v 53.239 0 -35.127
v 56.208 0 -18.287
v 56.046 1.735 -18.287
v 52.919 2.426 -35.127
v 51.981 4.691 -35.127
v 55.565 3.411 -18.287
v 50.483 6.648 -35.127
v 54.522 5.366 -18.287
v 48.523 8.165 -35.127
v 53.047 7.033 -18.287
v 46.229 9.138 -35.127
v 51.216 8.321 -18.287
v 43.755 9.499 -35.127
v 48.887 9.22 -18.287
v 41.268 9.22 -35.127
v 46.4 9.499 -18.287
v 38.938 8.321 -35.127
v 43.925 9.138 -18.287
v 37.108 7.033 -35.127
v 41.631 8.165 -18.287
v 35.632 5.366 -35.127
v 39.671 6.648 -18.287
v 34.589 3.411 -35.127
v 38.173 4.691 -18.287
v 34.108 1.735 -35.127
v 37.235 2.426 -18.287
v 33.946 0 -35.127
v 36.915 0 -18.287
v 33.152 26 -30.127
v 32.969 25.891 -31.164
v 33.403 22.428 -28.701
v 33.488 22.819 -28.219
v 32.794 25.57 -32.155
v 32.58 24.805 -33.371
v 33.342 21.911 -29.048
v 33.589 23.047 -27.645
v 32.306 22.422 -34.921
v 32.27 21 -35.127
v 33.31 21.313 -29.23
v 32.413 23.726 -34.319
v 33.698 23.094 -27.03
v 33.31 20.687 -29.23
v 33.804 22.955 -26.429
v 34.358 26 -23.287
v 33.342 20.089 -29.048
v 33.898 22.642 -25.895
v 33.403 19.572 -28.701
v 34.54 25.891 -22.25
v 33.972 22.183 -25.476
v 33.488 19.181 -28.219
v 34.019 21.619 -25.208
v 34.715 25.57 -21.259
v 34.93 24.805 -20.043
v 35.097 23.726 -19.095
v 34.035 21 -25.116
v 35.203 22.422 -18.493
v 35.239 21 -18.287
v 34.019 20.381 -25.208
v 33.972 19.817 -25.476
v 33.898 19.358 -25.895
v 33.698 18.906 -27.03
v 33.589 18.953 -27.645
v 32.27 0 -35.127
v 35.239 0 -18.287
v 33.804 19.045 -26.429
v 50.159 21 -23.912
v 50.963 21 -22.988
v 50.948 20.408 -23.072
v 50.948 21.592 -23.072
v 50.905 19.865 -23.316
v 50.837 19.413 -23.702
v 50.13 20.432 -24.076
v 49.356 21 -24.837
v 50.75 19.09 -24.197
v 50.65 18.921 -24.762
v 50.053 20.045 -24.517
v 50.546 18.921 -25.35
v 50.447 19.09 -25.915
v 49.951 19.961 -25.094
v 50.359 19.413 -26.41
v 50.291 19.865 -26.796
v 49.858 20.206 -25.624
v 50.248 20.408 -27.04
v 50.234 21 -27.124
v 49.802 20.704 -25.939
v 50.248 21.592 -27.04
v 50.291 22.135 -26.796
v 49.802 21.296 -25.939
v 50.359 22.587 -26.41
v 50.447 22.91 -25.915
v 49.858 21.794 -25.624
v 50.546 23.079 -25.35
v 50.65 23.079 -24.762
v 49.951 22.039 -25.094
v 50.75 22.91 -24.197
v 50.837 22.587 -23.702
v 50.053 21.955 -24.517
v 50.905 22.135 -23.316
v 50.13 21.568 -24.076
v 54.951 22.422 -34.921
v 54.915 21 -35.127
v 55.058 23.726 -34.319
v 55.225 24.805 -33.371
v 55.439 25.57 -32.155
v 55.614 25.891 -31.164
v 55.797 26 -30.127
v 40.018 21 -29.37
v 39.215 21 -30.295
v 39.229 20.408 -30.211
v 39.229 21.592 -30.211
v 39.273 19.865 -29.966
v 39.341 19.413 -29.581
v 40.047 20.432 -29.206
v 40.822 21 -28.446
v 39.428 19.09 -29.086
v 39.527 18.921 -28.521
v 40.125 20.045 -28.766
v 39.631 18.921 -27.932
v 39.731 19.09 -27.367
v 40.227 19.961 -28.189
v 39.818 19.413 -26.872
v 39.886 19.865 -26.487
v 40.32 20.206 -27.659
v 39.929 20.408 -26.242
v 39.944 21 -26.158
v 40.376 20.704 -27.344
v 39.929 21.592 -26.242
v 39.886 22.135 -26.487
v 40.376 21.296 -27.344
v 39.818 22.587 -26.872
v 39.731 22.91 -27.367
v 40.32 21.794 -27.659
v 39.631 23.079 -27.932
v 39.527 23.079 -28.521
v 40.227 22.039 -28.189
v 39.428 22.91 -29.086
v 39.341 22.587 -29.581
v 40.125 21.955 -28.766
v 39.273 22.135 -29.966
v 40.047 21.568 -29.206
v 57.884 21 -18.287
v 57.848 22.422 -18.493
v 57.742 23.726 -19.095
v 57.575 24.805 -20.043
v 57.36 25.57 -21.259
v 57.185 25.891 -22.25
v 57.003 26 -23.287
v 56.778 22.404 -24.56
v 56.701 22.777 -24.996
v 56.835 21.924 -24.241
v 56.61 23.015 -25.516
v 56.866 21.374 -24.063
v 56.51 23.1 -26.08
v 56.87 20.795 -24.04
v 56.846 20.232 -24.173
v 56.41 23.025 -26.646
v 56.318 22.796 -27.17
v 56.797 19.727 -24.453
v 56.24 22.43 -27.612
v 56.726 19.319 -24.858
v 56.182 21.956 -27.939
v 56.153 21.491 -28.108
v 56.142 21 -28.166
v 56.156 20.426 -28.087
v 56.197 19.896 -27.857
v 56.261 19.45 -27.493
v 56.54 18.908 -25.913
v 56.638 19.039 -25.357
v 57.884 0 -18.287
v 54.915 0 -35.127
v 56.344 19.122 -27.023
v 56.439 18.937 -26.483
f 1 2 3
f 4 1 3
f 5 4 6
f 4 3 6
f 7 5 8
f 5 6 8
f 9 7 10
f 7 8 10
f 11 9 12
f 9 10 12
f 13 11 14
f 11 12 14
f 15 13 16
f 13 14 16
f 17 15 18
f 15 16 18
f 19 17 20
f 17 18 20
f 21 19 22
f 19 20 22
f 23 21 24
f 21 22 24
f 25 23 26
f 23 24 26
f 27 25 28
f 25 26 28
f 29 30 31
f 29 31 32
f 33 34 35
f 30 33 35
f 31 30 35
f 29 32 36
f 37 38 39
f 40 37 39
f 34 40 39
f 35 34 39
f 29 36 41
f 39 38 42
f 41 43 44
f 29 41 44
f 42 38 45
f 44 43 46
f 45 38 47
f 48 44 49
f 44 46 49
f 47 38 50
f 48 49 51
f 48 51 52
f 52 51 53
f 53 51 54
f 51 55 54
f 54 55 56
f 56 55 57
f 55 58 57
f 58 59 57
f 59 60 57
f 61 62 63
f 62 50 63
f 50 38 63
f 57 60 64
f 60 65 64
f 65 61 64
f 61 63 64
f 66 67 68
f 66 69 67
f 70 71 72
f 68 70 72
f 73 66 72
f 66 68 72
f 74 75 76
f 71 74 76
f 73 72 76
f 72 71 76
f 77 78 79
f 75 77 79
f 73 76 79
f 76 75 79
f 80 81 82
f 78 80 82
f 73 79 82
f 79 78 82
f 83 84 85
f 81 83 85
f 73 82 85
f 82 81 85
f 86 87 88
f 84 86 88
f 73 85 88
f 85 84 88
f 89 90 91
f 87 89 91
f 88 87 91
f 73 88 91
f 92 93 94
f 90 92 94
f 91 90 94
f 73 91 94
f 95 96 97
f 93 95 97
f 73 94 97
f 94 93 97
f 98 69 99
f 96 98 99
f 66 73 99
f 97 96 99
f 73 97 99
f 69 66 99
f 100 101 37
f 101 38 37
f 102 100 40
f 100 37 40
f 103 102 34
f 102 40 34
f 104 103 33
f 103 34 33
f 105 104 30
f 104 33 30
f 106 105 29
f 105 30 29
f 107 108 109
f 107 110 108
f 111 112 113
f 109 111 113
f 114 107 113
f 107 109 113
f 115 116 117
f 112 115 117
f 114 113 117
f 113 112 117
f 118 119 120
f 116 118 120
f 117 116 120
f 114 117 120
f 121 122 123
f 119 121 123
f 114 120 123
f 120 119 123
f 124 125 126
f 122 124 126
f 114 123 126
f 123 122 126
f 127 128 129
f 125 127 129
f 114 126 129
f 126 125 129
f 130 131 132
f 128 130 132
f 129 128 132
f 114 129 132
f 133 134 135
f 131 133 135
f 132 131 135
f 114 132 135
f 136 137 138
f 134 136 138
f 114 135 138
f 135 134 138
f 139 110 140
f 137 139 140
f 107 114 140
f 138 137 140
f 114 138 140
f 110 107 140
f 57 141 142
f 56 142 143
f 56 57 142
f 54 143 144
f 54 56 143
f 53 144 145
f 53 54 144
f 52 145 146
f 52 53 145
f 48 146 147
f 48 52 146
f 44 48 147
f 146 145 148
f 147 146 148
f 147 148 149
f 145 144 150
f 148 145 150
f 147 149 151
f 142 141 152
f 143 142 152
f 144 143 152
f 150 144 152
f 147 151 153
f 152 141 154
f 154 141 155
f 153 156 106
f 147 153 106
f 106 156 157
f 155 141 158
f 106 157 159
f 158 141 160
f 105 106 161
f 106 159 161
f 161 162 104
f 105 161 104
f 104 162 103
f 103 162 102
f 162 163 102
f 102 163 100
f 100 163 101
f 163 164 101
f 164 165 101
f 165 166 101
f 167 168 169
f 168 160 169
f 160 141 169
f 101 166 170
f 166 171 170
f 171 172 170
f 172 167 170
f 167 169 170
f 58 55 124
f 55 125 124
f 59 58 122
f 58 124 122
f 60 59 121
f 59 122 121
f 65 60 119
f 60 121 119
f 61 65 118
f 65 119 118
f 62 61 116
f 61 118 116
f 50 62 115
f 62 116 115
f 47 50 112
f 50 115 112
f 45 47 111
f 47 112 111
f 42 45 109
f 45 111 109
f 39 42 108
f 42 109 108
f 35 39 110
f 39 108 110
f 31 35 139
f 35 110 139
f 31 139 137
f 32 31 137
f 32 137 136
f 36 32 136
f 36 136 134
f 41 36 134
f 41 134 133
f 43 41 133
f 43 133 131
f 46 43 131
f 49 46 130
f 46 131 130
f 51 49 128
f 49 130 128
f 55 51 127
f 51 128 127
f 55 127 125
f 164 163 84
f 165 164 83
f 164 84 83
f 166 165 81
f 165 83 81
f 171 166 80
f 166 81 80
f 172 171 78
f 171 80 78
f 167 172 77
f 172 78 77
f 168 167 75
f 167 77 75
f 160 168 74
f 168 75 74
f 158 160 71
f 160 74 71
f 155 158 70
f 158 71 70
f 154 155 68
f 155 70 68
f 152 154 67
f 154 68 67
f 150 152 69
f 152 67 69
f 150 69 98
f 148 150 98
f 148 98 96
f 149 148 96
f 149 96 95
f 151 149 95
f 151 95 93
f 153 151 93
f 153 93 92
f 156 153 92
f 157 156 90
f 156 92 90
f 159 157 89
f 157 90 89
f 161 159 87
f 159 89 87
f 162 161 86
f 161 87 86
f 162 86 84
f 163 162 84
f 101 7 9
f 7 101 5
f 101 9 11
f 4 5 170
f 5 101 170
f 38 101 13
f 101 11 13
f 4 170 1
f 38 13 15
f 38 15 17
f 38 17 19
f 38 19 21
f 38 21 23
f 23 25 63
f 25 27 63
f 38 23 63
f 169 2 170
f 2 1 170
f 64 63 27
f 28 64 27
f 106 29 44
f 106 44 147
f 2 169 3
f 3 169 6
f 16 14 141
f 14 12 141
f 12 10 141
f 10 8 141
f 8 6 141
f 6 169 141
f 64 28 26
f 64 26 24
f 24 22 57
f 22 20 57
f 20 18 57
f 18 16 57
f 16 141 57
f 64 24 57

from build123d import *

# Parameters (mm, degrees)
BOSS_EXTRUDE1_DEPTH             = 26
CUT_EXTRUDE1_DEPTH              = 26
CUT_EXTRUDE2_DEPTH              = 26
FILLET1_R                       = 5
M5_TAPPED_HOLE1_D               = 4.2
M5_TAPPED_HOLE1_DEPTH           = 6
M5_TAPPED_HOLE1_TIP             = 1.2618073
M5_TAPPED_HOLE1_ON_FACE_2_D     = 4.2
M5_TAPPED_HOLE1_ON_FACE_2_DEPTH = 6
M5_TAPPED_HOLE1_ON_FACE_2_TIP   = 1.2618073


with BuildPart() as part:
    # 草图1 → Boss-Extrude1 (new body)
    with BuildSketch(Plane(origin=(0, 0, 0), x_dir=(1, 0, 0), z_dir=(0, 1, 0))):
        Polygon((35.23935759, 18.286975519), (57.88435759, 18.286975519), (54.914973752, 35.127188096), (32.269973752, 35.127188096), align=None)
        Polygon((35.23935759, 18.286975519), (35.922187891, 14.414452446), (57.88435759, 18.286975519), align=None)
    extrude(amount=BOSS_EXTRUDE1_DEPTH)

    # Sketch1 → Cut-Extrude1 (cut)
    with BuildSketch(Plane(origin=(-1.381830042, 0, -7.836747596), x_dir=(0.984807753012208, 0, -0.17364817766693116), z_dir=(0.17364817766693116, 0, 0.984807753012208))):
        with BuildLine():
            Line((39.529978324, 0), (58.529978324, 0))
            ThreePointArc((58.529978324, 0), (49.029978324, 9.5), (39.529978324, 0))
        make_face()
    extrude(amount=-CUT_EXTRUDE1_DEPTH, mode=Mode.SUBTRACT)

    # Sketch2 → Cut-Extrude2 (cut)
    with BuildSketch(Plane(origin=(0, 26, 0), x_dir=(1, 0, 0), z_dir=(0, 1, 0))):
        Polygon((35.23935759, 18.286975519), (35.922187891, 14.414452446), (57.88435759, 18.286975519), align=None)
    extrude(amount=-CUT_EXTRUDE2_DEPTH, mode=Mode.SUBTRACT)

    # Fillet1
    fillet1_edges = [part.edges().sort_by_distance(p)[0] for p in [
        (43.592473752, 26, -35.127188096),
        (46.56185759, 26, -18.286975519),
    ]]
    fillet(fillet1_edges, radius=FILLET1_R)

    # M5 Tapped Hole1
    with Locations(Plane(origin=(33.670475294, 21, -27.184549163), x_dir=(-0.173648177667, 0, -0.984807753012), z_dir=(-0.984807753012, 0, 0.173648177667))):
        with Locations((0, 0)):
            Hole(M5_TAPPED_HOLE1_D / 2, depth=M5_TAPPED_HOLE1_DEPTH)
            with Locations((0, 0, -(M5_TAPPED_HOLE1_DEPTH + M5_TAPPED_HOLE1_TIP / 2))):  # 118° drill point
                Cone(0, M5_TAPPED_HOLE1_D / 2, M5_TAPPED_HOLE1_TIP, mode=Mode.SUBTRACT)

    # M5 Tapped Hole1 on face 2
    with Locations(Plane(origin=(56.507099646, 21, -26.097793462), x_dir=(0.17364796312, 0, 0.984807790843), z_dir=(0.984807790843, 0, -0.17364796312))):
        with Locations((0, 0)):
            Hole(M5_TAPPED_HOLE1_ON_FACE_2_D / 2, depth=M5_TAPPED_HOLE1_ON_FACE_2_DEPTH)
            with Locations((0, 0, -(M5_TAPPED_HOLE1_ON_FACE_2_DEPTH + M5_TAPPED_HOLE1_ON_FACE_2_TIP / 2))):  # 118° drill point
                Cone(0, M5_TAPPED_HOLE1_ON_FACE_2_D / 2, M5_TAPPED_HOLE1_ON_FACE_2_TIP, mode=Mode.SUBTRACT)


solid = part.part
